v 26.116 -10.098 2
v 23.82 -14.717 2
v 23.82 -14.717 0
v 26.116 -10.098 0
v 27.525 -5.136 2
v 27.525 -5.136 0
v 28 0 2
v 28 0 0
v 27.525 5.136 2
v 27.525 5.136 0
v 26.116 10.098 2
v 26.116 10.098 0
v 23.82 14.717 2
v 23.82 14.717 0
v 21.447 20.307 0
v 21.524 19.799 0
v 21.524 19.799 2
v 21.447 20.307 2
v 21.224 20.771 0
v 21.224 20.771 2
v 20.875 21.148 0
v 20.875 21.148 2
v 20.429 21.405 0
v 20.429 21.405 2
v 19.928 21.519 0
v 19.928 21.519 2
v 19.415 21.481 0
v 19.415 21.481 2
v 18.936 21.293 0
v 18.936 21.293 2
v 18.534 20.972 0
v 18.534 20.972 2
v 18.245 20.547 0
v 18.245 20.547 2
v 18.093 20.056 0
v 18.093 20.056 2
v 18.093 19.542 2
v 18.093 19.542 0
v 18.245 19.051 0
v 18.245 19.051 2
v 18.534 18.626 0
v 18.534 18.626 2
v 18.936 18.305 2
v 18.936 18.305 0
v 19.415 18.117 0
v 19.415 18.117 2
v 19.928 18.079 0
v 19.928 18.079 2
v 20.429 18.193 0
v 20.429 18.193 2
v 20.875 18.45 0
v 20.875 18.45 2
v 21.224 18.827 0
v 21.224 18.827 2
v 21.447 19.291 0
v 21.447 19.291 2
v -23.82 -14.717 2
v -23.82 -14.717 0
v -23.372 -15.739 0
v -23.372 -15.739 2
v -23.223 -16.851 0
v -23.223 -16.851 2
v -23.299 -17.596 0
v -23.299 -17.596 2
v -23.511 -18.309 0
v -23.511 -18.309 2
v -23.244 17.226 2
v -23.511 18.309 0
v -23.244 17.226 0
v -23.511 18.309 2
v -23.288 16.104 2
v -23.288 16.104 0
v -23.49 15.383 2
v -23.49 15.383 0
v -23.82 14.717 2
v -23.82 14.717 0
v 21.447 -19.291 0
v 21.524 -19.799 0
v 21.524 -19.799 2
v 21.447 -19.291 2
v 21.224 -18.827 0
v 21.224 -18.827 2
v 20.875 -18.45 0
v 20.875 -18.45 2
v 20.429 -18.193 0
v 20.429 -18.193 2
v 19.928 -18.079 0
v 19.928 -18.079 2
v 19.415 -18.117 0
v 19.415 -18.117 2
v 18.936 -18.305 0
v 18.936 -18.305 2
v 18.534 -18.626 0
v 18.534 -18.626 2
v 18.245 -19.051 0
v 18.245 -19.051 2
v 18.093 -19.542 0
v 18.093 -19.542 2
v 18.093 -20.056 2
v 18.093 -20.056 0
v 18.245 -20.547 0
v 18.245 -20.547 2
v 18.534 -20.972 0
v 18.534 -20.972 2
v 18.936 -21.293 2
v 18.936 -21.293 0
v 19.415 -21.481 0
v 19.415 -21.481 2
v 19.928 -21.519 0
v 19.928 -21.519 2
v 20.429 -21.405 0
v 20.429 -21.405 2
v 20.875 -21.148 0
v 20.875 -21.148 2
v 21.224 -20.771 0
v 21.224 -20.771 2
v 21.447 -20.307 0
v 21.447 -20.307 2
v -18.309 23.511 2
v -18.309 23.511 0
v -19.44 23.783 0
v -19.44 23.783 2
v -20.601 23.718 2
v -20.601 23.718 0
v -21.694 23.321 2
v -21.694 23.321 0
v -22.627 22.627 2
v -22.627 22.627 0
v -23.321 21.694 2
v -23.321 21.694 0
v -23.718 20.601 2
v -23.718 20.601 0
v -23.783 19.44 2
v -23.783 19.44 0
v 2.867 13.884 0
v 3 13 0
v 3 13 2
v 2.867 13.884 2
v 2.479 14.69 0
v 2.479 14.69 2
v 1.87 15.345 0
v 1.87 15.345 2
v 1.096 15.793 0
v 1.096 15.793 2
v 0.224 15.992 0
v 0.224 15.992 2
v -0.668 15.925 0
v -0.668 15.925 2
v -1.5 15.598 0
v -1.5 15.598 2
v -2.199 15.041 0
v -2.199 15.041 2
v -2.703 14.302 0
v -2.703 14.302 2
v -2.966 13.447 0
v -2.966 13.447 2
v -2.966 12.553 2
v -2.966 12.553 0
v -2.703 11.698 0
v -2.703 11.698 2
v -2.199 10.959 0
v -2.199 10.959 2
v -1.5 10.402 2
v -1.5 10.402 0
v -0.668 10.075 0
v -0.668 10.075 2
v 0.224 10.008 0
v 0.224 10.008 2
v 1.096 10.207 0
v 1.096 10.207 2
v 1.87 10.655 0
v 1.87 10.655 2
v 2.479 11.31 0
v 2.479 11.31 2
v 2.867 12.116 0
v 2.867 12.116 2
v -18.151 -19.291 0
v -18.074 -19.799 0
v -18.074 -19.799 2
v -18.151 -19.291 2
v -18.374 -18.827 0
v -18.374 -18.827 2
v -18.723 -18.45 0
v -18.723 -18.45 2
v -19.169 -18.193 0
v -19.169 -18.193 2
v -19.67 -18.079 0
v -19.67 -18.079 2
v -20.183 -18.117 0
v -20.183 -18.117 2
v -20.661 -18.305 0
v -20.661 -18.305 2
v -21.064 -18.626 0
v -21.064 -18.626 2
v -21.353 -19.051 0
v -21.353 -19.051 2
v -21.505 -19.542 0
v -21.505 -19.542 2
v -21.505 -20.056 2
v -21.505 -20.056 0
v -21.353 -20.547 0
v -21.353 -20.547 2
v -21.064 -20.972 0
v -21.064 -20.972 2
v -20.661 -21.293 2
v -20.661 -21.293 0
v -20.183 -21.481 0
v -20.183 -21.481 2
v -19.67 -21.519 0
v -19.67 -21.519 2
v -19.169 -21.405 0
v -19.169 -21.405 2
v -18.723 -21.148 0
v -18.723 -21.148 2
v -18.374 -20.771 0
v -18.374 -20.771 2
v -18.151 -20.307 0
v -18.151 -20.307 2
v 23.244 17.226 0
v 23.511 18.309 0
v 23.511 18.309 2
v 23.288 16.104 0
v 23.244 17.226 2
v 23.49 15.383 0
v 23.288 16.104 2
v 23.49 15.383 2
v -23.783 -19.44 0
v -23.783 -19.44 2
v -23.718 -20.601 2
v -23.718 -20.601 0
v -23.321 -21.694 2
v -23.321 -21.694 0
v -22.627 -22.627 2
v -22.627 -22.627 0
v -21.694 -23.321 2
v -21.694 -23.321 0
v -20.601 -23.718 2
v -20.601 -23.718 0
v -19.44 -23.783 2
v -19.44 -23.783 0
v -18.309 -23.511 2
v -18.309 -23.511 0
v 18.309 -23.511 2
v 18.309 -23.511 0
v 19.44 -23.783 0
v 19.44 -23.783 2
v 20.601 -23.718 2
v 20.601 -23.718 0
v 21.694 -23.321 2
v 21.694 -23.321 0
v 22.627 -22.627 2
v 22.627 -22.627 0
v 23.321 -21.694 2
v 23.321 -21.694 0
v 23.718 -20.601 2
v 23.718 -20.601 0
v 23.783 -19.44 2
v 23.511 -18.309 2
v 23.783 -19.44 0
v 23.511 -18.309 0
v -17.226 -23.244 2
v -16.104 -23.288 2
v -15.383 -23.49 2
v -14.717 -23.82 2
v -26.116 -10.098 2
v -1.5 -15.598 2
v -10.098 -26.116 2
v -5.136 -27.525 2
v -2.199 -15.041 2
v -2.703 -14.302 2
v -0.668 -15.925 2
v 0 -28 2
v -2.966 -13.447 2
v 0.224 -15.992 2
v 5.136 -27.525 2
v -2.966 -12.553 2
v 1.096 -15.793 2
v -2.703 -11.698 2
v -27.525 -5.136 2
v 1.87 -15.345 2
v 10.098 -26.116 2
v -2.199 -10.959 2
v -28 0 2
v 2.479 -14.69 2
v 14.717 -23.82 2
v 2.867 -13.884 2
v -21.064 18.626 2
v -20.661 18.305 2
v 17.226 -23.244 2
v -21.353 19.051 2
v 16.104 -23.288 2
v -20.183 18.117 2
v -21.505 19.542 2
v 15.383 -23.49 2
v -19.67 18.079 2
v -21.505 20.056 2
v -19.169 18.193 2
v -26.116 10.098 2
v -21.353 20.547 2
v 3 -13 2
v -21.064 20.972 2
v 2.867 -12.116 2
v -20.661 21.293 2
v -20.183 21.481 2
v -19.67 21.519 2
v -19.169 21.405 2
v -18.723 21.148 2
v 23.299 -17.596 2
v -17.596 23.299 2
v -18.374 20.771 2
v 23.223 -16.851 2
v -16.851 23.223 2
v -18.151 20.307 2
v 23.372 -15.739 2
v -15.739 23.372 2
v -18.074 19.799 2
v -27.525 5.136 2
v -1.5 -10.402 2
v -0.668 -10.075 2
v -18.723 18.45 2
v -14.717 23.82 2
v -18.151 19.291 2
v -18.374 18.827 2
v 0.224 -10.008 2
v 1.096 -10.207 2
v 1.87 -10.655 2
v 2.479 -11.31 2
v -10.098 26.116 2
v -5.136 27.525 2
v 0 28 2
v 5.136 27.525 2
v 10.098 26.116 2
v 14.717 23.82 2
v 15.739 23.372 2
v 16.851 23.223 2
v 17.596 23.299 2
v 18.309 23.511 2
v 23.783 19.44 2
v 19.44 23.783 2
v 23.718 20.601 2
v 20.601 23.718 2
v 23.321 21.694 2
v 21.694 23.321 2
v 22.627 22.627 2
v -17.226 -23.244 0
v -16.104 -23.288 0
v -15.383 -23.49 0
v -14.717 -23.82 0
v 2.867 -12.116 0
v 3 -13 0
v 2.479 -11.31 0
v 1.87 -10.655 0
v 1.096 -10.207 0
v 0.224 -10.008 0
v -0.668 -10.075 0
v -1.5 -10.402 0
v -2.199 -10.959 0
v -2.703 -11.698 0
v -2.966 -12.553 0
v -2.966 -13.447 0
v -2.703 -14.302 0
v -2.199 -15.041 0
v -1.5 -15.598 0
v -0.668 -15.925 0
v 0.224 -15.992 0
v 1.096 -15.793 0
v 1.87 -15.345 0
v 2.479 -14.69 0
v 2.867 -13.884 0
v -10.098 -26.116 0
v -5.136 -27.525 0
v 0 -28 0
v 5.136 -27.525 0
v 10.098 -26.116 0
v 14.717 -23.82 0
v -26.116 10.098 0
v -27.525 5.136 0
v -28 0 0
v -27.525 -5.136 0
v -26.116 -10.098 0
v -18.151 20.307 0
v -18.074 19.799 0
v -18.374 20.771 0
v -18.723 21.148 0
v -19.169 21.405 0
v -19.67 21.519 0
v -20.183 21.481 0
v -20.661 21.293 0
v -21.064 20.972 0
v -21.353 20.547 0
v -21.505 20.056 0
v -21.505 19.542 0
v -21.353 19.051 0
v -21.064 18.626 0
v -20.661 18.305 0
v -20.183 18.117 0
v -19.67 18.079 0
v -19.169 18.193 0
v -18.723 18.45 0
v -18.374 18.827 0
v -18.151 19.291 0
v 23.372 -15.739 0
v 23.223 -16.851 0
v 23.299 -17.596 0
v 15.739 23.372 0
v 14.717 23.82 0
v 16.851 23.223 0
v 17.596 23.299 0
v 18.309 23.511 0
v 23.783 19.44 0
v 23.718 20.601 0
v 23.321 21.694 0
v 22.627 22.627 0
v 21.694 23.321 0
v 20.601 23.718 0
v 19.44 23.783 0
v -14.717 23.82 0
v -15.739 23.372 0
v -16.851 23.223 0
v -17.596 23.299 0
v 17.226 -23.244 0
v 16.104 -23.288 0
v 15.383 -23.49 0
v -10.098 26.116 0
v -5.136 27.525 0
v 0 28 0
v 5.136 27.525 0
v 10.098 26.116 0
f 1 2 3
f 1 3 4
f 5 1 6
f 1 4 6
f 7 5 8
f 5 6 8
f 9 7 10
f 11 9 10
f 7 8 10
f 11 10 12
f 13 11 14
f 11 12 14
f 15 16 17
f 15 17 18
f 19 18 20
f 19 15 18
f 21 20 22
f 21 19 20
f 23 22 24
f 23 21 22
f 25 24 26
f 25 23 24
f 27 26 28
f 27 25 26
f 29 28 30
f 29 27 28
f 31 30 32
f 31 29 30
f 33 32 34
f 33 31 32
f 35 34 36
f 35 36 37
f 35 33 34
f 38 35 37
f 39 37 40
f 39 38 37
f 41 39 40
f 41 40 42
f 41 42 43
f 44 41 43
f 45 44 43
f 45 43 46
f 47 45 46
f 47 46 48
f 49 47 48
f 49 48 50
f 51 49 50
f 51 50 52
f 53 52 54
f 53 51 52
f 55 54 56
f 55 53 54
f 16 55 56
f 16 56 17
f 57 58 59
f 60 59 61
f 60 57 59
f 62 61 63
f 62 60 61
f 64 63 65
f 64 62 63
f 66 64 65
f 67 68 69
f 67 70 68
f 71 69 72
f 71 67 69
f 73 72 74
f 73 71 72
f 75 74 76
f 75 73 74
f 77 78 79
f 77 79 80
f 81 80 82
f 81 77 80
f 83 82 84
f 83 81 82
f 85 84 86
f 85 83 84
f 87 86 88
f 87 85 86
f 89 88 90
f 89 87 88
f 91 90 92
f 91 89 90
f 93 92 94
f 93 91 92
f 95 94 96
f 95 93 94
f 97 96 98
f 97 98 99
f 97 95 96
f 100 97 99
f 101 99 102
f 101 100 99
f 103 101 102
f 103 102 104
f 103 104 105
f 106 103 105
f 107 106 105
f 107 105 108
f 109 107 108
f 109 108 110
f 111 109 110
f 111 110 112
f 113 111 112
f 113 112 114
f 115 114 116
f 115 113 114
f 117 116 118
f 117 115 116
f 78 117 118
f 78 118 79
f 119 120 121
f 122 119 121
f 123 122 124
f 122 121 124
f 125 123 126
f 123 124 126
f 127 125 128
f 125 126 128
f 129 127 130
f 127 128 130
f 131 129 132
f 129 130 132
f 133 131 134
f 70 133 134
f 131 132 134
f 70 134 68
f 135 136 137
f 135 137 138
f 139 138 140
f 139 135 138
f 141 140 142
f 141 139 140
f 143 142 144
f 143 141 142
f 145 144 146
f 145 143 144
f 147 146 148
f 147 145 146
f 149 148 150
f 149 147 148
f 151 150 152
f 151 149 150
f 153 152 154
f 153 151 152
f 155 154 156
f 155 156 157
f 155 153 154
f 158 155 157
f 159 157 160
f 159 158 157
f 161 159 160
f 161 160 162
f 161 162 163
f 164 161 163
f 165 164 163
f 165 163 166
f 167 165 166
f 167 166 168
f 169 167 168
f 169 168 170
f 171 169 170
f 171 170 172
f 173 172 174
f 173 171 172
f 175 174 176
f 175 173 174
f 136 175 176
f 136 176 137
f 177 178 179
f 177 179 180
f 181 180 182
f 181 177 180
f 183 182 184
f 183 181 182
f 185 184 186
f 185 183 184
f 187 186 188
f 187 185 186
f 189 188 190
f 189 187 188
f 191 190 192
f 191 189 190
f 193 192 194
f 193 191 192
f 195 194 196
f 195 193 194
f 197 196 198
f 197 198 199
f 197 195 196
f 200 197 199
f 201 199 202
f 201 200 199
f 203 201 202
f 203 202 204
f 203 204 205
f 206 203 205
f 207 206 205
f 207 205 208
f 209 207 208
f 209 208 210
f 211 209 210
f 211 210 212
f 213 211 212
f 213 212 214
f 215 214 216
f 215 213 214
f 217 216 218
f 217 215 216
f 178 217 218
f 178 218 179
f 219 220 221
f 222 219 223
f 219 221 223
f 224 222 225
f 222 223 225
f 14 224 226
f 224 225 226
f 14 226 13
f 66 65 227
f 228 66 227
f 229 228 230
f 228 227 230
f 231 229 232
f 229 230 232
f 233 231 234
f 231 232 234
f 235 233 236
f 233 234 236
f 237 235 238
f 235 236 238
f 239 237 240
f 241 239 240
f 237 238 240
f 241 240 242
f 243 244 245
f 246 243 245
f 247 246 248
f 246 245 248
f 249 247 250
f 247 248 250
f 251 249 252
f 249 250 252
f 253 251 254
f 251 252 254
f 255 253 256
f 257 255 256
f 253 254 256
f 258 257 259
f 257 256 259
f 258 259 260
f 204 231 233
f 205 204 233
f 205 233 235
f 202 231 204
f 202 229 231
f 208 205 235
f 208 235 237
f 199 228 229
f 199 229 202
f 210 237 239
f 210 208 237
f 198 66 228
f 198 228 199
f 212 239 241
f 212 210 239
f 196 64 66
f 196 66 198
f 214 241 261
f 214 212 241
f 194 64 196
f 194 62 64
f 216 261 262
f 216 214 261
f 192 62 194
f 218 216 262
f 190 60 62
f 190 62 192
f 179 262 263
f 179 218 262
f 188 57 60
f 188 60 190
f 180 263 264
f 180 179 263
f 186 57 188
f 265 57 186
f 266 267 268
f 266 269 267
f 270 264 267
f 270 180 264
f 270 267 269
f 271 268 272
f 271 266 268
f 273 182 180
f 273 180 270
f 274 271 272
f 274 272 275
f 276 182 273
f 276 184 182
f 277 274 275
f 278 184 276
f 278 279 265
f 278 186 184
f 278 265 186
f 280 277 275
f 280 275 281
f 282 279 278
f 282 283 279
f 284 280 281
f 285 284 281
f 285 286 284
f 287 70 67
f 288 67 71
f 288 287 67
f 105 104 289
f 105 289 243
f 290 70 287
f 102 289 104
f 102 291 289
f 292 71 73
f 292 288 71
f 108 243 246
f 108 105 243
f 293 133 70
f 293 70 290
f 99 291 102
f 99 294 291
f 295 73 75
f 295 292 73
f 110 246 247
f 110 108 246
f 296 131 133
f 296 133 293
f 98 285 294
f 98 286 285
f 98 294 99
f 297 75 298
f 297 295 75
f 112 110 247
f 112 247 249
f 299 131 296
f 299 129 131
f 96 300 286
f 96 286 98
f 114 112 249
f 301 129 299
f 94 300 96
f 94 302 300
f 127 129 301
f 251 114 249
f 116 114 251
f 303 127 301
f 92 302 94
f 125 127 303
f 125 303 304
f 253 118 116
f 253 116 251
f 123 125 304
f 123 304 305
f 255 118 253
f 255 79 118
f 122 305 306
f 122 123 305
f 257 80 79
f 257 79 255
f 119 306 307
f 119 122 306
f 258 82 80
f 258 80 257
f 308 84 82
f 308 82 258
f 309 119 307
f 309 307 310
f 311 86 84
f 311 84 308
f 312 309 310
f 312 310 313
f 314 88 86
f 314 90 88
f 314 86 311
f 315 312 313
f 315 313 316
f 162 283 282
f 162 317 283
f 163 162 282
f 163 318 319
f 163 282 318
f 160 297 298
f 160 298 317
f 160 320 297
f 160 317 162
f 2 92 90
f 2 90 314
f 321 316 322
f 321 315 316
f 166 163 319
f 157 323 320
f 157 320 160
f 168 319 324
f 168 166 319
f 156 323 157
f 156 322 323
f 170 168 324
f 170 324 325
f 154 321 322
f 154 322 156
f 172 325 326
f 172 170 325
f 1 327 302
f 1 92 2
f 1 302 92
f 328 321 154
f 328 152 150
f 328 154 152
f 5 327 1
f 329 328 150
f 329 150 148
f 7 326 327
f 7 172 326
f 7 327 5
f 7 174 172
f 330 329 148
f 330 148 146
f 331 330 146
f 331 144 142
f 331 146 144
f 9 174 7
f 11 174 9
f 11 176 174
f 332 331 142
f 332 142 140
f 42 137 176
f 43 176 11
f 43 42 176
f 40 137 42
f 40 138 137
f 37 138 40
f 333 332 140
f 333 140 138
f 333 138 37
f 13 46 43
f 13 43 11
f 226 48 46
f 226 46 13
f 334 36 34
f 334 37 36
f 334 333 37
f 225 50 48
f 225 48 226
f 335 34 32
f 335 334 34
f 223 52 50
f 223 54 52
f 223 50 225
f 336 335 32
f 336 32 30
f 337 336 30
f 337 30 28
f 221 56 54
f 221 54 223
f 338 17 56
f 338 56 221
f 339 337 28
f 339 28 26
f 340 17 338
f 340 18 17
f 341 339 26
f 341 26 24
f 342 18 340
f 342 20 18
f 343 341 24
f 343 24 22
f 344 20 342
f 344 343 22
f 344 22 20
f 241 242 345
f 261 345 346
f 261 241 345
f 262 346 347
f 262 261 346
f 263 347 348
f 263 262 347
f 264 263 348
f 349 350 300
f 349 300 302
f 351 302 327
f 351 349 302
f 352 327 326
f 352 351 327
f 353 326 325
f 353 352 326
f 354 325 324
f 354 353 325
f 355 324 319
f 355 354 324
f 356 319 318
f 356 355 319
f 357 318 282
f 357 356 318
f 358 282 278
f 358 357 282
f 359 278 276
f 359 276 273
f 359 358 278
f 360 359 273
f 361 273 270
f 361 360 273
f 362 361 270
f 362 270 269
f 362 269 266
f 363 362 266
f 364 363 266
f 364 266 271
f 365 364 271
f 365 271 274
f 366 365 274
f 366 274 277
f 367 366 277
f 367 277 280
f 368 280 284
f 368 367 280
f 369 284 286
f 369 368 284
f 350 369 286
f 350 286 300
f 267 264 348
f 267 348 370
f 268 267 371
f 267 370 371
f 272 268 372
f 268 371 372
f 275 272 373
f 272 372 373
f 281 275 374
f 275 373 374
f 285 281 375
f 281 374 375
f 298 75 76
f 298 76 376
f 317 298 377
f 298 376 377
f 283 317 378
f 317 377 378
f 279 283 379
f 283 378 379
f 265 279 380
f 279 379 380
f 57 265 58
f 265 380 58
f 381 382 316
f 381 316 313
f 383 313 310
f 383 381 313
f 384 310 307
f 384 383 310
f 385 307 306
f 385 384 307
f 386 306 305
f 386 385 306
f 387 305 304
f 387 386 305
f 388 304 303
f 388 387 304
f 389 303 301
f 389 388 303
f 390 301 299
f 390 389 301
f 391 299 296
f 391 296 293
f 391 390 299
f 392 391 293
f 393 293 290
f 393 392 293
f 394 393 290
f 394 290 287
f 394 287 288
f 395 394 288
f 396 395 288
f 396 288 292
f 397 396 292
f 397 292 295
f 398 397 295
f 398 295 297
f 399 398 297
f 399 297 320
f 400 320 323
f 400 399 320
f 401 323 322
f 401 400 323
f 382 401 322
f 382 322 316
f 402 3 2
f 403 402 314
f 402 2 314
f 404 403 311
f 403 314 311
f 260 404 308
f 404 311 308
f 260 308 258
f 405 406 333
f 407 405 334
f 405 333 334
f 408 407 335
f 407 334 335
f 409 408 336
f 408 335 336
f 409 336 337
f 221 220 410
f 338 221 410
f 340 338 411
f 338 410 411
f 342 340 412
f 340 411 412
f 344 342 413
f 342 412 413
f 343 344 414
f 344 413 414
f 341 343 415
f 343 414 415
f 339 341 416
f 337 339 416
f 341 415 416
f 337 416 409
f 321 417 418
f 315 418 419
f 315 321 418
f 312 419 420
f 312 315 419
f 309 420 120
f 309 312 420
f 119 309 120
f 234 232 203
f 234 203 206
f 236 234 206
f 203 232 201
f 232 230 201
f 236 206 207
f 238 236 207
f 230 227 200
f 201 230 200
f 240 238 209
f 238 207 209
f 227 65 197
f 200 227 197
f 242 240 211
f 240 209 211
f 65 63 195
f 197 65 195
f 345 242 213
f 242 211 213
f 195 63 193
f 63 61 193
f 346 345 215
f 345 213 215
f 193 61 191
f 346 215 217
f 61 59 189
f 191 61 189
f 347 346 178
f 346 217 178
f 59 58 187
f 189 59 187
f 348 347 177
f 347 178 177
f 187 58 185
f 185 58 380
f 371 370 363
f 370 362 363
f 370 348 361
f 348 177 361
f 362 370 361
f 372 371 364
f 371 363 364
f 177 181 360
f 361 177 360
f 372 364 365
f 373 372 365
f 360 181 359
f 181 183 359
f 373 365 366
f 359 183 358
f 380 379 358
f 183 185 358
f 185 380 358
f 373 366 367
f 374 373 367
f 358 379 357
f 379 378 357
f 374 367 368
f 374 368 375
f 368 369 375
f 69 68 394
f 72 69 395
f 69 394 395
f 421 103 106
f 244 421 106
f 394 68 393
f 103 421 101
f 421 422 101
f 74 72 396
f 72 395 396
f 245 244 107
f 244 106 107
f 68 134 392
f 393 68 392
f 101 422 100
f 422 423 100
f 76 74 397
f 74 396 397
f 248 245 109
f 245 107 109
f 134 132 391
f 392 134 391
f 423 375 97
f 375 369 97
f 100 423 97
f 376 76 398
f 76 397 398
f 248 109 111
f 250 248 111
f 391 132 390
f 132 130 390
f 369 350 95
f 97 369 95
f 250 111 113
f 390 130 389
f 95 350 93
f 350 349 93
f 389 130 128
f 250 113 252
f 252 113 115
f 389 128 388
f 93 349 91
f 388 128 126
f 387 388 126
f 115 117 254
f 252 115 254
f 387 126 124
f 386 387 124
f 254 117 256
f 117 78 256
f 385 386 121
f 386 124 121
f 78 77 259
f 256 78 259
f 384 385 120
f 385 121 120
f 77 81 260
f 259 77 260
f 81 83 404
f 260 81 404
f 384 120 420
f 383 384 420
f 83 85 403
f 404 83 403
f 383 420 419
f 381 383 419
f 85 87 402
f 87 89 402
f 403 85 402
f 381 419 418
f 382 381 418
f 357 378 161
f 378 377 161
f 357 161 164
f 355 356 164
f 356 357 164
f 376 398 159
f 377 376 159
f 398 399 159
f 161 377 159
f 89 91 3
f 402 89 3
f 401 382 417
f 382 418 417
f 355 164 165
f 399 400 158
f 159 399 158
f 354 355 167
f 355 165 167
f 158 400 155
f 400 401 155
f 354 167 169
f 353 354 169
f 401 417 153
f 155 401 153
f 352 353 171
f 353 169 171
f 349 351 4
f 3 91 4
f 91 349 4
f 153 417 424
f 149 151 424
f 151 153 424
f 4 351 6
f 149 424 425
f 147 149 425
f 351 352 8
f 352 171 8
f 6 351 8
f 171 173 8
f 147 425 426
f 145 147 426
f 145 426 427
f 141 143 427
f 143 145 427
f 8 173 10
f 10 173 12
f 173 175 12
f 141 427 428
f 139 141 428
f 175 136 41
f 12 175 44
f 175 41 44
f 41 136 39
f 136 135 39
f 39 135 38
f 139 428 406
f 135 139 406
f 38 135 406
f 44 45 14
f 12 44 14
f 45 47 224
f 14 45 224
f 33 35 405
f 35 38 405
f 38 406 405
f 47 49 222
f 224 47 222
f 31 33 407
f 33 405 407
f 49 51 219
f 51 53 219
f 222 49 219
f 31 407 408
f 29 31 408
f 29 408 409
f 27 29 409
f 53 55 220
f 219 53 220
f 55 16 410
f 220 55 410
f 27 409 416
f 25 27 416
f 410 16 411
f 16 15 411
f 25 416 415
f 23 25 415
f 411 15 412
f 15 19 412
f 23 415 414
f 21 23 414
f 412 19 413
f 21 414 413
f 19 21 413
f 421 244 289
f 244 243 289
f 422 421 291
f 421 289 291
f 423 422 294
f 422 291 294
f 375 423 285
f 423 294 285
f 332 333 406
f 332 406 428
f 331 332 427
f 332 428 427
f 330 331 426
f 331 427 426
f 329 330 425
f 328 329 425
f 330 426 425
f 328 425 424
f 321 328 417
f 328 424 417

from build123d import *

# Parameters (mm, degrees)
SKETCH1_R           = 1.725
SKETCH1_R_2         = 3
BOSS_EXTRUDE1_DEPTH = 2
FILLET1_R           = 4


with BuildPart() as part:
    # Sketch1 → Boss-Extrude1 (new body)
    with BuildSketch(Plane.XY):
        with BuildLine():
            ThreePointArc((16.775756842, 22.418161887), (0, 28), (-16.775756842, 22.418161887))
            ThreePointArc((-16.775756842, 22.418161887), (-22.627416998, 22.627416998), (-22.418161887, 16.775756842))
            ThreePointArc((-22.418161887, 16.775756842), (-28, 0), (-22.418161887, -16.775756842))
            ThreePointArc((-22.418161887, -16.775756842), (-22.627416998, -22.627416998), (-16.775756842, -22.418161887))
            ThreePointArc((-16.775756842, -22.418161887), (0, -28), (16.775756842, -22.418161887))
            ThreePointArc((16.775756842, -22.418161887), (22.627416998, -22.627416998), (22.418161887, -16.775756842))
            ThreePointArc((22.418161887, -16.775756842), (28, 0), (22.418161887, 16.775756842))
            ThreePointArc((22.418161887, 16.775756842), (22.627416998, 22.627416998), (16.775756842, 22.418161887))
        make_face()
        with Locations((19.798989873, 19.798989873)):
            Circle(SKETCH1_R, mode=Mode.SUBTRACT)
        with Locations((-19.798989873, 19.798989873)):
            Circle(SKETCH1_R, mode=Mode.SUBTRACT)
        with Locations((-19.798989873, -19.798989873)):
            Circle(SKETCH1_R, mode=Mode.SUBTRACT)
        with Locations((19.798989873, -19.798989873)):
            Circle(SKETCH1_R, mode=Mode.SUBTRACT)
        with Locations((0, 13)):
            Circle(SKETCH1_R_2, mode=Mode.SUBTRACT)
        with Locations((0, -13)):
            Circle(SKETCH1_R_2, mode=Mode.SUBTRACT)
    extrude(amount=BOSS_EXTRUDE1_DEPTH)

    # Fillet1
    fillet1_edges = [part.edges().sort_by_distance(p)[0] for p in [
        (-22.418161887, 16.775756842, 1),
        (-16.775756842, 22.418161887, 1),
        (16.775756842, 22.418161887, 1),
        (22.418161887, 16.775756842, 1),
        (22.418161887, -16.775756842, 1),
        (16.775756842, -22.418161887, 1),
        (-16.775756842, -22.418161887, 1),
        (-22.418161887, -16.775756842, 1),
    ]]
    fillet(fillet1_edges, radius=FILLET1_R)


solid = part.part
